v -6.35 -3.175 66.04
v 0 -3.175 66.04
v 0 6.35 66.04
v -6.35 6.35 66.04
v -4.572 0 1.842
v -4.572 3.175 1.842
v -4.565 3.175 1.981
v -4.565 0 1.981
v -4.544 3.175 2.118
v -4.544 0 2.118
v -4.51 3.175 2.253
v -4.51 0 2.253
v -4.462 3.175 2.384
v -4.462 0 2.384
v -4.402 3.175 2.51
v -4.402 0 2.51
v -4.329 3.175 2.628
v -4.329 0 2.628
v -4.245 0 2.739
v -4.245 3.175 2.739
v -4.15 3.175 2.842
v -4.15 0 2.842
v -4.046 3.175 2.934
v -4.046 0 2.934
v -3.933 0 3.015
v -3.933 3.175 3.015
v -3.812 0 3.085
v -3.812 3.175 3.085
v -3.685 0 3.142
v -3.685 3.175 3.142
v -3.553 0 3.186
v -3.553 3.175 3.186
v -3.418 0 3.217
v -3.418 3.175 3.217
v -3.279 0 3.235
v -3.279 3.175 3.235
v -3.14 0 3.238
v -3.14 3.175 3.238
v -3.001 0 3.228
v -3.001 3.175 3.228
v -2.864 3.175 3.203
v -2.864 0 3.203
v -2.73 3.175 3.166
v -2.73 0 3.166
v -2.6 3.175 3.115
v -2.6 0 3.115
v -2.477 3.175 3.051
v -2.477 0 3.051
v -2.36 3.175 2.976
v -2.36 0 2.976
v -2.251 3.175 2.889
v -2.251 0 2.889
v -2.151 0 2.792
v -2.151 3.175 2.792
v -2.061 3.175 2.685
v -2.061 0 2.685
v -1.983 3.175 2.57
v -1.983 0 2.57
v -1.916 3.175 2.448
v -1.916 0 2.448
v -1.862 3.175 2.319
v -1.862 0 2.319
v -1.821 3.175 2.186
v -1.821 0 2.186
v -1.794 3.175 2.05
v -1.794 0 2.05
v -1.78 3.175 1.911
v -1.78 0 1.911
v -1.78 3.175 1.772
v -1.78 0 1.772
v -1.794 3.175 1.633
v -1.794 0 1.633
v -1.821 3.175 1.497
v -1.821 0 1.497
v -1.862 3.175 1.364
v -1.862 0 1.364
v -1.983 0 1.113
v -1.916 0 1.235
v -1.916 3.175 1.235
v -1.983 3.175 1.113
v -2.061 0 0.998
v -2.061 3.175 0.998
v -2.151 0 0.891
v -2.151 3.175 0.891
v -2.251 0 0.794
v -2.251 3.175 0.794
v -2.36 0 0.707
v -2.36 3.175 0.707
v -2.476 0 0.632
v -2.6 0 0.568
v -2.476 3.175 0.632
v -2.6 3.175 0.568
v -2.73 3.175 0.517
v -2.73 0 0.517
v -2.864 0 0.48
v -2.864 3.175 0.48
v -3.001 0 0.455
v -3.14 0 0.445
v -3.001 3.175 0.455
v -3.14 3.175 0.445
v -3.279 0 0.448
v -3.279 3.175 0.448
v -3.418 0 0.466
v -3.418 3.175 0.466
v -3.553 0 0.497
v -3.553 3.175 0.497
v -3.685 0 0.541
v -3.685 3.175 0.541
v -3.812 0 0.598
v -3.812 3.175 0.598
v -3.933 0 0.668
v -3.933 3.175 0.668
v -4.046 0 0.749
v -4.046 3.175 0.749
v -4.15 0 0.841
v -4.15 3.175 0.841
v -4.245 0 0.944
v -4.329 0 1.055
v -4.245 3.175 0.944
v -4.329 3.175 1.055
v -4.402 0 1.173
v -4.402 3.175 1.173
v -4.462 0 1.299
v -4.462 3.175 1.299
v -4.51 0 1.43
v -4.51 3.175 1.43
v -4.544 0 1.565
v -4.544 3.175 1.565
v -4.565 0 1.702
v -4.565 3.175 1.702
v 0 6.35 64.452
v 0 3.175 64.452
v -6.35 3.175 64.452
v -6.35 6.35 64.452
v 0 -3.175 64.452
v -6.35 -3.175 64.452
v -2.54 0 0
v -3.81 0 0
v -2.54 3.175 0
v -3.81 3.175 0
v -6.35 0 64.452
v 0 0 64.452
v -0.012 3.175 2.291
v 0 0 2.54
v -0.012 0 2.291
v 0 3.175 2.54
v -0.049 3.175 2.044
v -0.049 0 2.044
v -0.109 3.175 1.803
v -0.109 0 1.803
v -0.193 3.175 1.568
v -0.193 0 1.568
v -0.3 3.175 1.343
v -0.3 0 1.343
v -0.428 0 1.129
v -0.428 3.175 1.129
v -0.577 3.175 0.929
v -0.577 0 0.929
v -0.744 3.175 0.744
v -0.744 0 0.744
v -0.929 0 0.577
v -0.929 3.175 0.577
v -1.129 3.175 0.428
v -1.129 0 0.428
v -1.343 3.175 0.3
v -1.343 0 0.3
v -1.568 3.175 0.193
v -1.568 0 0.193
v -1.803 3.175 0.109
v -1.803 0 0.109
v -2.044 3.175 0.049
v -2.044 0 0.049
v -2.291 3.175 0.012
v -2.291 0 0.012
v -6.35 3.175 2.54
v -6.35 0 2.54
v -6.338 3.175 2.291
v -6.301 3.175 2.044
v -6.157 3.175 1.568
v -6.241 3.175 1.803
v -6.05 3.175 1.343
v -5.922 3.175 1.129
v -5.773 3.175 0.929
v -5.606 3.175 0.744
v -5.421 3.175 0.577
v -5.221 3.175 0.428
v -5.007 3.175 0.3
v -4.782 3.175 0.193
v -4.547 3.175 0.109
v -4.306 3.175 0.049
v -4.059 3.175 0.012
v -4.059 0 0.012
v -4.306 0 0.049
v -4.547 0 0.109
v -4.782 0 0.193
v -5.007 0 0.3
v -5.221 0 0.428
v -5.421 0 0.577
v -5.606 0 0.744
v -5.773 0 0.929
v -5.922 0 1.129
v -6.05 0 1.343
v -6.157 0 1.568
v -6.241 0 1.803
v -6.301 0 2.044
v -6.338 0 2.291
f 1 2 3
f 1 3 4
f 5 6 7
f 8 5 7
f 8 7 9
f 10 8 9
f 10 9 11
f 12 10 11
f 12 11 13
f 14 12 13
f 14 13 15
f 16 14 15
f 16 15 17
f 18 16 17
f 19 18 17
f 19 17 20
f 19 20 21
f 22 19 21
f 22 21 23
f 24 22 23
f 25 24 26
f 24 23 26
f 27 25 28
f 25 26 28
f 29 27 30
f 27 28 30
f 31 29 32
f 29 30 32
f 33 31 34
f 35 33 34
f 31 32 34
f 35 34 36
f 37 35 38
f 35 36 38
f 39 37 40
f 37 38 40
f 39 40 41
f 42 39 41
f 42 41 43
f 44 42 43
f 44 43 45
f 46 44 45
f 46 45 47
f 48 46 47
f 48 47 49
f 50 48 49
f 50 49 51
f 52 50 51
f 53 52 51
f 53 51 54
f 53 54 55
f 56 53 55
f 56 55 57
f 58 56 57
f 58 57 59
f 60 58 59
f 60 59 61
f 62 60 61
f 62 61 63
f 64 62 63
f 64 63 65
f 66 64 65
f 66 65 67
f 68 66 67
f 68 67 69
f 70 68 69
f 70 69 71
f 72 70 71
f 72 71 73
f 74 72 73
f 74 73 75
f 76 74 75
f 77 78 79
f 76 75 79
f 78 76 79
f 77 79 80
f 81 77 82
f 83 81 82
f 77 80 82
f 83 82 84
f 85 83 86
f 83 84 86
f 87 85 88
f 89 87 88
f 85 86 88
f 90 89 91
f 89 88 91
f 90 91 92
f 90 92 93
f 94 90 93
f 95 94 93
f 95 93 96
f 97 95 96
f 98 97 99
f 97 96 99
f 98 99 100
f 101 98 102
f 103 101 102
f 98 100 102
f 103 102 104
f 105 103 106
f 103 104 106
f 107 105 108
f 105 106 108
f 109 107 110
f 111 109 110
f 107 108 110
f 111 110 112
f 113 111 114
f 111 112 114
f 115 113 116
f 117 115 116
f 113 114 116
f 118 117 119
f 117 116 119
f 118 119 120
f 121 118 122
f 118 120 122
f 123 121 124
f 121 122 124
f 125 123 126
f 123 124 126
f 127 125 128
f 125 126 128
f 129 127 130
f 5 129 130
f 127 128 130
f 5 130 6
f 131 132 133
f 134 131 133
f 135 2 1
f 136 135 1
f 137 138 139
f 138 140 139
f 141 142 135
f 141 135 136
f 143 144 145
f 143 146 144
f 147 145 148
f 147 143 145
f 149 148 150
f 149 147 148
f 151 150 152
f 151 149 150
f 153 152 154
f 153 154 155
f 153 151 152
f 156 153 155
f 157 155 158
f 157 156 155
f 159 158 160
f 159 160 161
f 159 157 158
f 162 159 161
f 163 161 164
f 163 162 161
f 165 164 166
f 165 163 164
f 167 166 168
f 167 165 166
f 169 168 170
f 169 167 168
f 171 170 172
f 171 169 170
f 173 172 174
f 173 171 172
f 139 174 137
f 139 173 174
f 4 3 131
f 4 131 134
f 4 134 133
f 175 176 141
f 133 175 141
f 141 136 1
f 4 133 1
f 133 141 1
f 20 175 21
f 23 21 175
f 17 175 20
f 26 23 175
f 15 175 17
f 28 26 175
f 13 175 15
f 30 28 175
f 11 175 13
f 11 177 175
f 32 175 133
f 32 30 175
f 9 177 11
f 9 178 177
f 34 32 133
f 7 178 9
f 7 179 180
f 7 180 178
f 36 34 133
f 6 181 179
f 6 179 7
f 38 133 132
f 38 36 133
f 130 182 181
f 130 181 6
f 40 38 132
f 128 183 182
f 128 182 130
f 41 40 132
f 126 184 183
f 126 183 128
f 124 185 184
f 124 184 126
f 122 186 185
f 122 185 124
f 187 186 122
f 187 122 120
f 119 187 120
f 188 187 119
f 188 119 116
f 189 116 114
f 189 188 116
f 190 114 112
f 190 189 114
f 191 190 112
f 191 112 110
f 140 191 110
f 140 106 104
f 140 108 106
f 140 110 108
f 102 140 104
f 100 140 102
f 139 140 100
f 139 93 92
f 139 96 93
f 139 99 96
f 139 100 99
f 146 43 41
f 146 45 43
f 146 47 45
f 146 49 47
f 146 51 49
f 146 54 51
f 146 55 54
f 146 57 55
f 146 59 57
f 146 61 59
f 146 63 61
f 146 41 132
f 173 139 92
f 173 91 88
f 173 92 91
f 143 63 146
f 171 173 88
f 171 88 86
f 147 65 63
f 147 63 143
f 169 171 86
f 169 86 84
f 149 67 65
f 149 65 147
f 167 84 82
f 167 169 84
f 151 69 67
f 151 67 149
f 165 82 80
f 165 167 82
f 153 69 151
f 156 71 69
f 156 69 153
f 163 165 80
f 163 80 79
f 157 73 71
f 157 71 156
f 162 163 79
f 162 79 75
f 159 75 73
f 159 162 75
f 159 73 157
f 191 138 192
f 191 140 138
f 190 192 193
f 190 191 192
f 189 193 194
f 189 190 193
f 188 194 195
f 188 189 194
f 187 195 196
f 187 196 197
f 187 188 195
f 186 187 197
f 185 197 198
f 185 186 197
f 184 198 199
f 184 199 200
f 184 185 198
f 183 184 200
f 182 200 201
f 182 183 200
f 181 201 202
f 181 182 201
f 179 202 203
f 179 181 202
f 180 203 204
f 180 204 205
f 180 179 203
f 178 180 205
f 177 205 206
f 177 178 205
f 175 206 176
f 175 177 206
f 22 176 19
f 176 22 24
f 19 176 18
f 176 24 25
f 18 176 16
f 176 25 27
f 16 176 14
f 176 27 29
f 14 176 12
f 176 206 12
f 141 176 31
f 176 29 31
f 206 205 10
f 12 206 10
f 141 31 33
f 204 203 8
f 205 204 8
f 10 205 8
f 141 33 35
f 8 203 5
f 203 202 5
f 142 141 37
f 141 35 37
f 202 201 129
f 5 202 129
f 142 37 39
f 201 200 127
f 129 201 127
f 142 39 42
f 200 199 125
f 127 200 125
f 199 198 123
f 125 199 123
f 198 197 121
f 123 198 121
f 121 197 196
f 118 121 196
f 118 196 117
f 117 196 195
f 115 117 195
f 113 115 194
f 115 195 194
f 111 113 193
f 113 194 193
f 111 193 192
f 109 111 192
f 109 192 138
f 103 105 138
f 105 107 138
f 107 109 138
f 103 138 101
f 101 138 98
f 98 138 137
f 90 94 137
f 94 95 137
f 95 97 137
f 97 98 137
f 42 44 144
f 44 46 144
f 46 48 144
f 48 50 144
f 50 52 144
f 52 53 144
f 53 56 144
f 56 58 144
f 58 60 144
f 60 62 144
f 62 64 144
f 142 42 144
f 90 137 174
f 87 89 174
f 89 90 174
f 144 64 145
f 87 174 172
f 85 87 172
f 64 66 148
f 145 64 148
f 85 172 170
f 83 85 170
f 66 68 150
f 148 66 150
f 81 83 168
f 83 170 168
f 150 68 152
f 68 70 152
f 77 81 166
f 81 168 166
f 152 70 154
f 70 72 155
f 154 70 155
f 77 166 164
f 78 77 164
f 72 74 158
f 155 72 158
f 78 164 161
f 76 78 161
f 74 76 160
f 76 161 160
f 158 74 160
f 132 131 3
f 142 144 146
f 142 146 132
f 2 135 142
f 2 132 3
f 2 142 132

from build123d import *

# Parameters (mm, degrees)
F0_W          = 6.35
F0_H          = 3.175
F1_DEPTH      = 66.04
F2_W          = 6.35
F2_H          = 1.5875
F3_DEPTH      = 3.175
F3_DEPTH_BACK = 6.35
F4_R          = 1.397
F5_DEPTH      = 25.4
F6_R          = 2.54


with BuildPart() as f1:
    # F0 (on Top) → F1 (new body)
    with BuildSketch(Plane.XY):
        with Locations((-3.175, 1.5875)):
            Rectangle(F0_W, F0_H)
    extrude(amount=F1_DEPTH)

    # F2 (on face) → F3 (join, two sides)
    with BuildSketch(Plane(origin=(0, 3.175, 0), x_dir=(-1, 0, 0), z_dir=(0, 1, 0))) as f3_sk:
        with Locations((3.175, 65.24625)):
            Rectangle(F2_W, F2_H)
    extrude(amount=F3_DEPTH)
    extrude(f3_sk.sketch, amount=-F3_DEPTH_BACK)

    # F4 (on face) → F5 (cut)
    with BuildSketch(Plane(origin=(0, 3.175, 0), x_dir=(-1, 0, 0), z_dir=(0, 1, 0))):
        with Locations((3.175, 1.8415)):
            Circle(F4_R)
    extrude(amount=-F5_DEPTH, mode=Mode.SUBTRACT)

    # F6
    f6_edges = [f1.edges().sort_by_distance(p)[0] for p in [
        (-6.35, 1.5875, 0),
        (0, 1.5875, 0),
    ]]
    fillet(f6_edges, radius=F6_R)


solid = f1.part
